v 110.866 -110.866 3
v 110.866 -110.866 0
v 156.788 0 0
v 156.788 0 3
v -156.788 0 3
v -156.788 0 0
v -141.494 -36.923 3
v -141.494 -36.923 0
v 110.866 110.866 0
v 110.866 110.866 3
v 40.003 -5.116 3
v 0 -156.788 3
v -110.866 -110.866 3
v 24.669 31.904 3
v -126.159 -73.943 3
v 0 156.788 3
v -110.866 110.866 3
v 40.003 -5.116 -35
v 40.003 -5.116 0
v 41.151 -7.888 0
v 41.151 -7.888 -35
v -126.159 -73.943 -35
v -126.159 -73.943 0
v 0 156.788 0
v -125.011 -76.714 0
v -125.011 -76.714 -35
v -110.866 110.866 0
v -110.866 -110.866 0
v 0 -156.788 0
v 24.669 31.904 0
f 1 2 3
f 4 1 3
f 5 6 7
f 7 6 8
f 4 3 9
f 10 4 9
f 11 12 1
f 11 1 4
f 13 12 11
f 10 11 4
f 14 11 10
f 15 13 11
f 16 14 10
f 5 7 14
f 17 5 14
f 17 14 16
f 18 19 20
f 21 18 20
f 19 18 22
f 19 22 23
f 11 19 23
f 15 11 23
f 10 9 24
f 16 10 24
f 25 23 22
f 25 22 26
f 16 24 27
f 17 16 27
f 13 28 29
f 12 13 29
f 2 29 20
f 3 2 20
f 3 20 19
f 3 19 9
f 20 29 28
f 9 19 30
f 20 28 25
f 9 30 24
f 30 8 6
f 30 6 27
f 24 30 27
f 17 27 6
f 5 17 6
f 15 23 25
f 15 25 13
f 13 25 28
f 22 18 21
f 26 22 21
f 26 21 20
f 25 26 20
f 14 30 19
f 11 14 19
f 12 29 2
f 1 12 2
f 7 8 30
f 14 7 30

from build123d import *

# Parameters (mm, degrees)
BOSS_EXTRUDE4_DEPTH = 3
BOSS_EXTRUDE5_START = -179.852814
SKETCH7_W           = 3
SKETCH7_H           = 35
BOSS_EXTRUDE5_DEPTH = 179.852814


with BuildPart() as part:
    # Sketch6 → Boss-Extrude4 (new body)
    with BuildSketch(Plane(origin=(0, 0, 0), x_dir=(0, 1, 0), z_dir=(0, 0, 1))):
        Polygon((156.787555785, 0), (110.865543901, 110.865543901), (0, 156.787555785), (-36.922845517, 141.493612411), (31.903846567, -24.66872107), (-5.116006301, -40.002846205), (-73.942698385, 126.159487276), (-110.865543901, 110.865543901), (-156.787555785, 0), (-110.865543901, -110.865543901), (0, -156.787555785), (110.865543901, -110.865543901), align=None)
    extrude(amount=BOSS_EXTRUDE4_DEPTH)

    # Sketch7 → Boss-Extrude5 (add)
    with BuildSketch(Plane(origin=(-133.826549843, -55.432771951, 0), x_dir=(0.38268343236508956, -0.9238795325112868, 0), z_dir=(-0.9238795325112868, -0.38268343236508956, 0)).offset(BOSS_EXTRUDE5_START)):
        with Locations((21.535, -17.5)):
            Rectangle(SKETCH7_W, SKETCH7_H)
    extrude(amount=BOSS_EXTRUDE5_DEPTH)


solid = part.part
